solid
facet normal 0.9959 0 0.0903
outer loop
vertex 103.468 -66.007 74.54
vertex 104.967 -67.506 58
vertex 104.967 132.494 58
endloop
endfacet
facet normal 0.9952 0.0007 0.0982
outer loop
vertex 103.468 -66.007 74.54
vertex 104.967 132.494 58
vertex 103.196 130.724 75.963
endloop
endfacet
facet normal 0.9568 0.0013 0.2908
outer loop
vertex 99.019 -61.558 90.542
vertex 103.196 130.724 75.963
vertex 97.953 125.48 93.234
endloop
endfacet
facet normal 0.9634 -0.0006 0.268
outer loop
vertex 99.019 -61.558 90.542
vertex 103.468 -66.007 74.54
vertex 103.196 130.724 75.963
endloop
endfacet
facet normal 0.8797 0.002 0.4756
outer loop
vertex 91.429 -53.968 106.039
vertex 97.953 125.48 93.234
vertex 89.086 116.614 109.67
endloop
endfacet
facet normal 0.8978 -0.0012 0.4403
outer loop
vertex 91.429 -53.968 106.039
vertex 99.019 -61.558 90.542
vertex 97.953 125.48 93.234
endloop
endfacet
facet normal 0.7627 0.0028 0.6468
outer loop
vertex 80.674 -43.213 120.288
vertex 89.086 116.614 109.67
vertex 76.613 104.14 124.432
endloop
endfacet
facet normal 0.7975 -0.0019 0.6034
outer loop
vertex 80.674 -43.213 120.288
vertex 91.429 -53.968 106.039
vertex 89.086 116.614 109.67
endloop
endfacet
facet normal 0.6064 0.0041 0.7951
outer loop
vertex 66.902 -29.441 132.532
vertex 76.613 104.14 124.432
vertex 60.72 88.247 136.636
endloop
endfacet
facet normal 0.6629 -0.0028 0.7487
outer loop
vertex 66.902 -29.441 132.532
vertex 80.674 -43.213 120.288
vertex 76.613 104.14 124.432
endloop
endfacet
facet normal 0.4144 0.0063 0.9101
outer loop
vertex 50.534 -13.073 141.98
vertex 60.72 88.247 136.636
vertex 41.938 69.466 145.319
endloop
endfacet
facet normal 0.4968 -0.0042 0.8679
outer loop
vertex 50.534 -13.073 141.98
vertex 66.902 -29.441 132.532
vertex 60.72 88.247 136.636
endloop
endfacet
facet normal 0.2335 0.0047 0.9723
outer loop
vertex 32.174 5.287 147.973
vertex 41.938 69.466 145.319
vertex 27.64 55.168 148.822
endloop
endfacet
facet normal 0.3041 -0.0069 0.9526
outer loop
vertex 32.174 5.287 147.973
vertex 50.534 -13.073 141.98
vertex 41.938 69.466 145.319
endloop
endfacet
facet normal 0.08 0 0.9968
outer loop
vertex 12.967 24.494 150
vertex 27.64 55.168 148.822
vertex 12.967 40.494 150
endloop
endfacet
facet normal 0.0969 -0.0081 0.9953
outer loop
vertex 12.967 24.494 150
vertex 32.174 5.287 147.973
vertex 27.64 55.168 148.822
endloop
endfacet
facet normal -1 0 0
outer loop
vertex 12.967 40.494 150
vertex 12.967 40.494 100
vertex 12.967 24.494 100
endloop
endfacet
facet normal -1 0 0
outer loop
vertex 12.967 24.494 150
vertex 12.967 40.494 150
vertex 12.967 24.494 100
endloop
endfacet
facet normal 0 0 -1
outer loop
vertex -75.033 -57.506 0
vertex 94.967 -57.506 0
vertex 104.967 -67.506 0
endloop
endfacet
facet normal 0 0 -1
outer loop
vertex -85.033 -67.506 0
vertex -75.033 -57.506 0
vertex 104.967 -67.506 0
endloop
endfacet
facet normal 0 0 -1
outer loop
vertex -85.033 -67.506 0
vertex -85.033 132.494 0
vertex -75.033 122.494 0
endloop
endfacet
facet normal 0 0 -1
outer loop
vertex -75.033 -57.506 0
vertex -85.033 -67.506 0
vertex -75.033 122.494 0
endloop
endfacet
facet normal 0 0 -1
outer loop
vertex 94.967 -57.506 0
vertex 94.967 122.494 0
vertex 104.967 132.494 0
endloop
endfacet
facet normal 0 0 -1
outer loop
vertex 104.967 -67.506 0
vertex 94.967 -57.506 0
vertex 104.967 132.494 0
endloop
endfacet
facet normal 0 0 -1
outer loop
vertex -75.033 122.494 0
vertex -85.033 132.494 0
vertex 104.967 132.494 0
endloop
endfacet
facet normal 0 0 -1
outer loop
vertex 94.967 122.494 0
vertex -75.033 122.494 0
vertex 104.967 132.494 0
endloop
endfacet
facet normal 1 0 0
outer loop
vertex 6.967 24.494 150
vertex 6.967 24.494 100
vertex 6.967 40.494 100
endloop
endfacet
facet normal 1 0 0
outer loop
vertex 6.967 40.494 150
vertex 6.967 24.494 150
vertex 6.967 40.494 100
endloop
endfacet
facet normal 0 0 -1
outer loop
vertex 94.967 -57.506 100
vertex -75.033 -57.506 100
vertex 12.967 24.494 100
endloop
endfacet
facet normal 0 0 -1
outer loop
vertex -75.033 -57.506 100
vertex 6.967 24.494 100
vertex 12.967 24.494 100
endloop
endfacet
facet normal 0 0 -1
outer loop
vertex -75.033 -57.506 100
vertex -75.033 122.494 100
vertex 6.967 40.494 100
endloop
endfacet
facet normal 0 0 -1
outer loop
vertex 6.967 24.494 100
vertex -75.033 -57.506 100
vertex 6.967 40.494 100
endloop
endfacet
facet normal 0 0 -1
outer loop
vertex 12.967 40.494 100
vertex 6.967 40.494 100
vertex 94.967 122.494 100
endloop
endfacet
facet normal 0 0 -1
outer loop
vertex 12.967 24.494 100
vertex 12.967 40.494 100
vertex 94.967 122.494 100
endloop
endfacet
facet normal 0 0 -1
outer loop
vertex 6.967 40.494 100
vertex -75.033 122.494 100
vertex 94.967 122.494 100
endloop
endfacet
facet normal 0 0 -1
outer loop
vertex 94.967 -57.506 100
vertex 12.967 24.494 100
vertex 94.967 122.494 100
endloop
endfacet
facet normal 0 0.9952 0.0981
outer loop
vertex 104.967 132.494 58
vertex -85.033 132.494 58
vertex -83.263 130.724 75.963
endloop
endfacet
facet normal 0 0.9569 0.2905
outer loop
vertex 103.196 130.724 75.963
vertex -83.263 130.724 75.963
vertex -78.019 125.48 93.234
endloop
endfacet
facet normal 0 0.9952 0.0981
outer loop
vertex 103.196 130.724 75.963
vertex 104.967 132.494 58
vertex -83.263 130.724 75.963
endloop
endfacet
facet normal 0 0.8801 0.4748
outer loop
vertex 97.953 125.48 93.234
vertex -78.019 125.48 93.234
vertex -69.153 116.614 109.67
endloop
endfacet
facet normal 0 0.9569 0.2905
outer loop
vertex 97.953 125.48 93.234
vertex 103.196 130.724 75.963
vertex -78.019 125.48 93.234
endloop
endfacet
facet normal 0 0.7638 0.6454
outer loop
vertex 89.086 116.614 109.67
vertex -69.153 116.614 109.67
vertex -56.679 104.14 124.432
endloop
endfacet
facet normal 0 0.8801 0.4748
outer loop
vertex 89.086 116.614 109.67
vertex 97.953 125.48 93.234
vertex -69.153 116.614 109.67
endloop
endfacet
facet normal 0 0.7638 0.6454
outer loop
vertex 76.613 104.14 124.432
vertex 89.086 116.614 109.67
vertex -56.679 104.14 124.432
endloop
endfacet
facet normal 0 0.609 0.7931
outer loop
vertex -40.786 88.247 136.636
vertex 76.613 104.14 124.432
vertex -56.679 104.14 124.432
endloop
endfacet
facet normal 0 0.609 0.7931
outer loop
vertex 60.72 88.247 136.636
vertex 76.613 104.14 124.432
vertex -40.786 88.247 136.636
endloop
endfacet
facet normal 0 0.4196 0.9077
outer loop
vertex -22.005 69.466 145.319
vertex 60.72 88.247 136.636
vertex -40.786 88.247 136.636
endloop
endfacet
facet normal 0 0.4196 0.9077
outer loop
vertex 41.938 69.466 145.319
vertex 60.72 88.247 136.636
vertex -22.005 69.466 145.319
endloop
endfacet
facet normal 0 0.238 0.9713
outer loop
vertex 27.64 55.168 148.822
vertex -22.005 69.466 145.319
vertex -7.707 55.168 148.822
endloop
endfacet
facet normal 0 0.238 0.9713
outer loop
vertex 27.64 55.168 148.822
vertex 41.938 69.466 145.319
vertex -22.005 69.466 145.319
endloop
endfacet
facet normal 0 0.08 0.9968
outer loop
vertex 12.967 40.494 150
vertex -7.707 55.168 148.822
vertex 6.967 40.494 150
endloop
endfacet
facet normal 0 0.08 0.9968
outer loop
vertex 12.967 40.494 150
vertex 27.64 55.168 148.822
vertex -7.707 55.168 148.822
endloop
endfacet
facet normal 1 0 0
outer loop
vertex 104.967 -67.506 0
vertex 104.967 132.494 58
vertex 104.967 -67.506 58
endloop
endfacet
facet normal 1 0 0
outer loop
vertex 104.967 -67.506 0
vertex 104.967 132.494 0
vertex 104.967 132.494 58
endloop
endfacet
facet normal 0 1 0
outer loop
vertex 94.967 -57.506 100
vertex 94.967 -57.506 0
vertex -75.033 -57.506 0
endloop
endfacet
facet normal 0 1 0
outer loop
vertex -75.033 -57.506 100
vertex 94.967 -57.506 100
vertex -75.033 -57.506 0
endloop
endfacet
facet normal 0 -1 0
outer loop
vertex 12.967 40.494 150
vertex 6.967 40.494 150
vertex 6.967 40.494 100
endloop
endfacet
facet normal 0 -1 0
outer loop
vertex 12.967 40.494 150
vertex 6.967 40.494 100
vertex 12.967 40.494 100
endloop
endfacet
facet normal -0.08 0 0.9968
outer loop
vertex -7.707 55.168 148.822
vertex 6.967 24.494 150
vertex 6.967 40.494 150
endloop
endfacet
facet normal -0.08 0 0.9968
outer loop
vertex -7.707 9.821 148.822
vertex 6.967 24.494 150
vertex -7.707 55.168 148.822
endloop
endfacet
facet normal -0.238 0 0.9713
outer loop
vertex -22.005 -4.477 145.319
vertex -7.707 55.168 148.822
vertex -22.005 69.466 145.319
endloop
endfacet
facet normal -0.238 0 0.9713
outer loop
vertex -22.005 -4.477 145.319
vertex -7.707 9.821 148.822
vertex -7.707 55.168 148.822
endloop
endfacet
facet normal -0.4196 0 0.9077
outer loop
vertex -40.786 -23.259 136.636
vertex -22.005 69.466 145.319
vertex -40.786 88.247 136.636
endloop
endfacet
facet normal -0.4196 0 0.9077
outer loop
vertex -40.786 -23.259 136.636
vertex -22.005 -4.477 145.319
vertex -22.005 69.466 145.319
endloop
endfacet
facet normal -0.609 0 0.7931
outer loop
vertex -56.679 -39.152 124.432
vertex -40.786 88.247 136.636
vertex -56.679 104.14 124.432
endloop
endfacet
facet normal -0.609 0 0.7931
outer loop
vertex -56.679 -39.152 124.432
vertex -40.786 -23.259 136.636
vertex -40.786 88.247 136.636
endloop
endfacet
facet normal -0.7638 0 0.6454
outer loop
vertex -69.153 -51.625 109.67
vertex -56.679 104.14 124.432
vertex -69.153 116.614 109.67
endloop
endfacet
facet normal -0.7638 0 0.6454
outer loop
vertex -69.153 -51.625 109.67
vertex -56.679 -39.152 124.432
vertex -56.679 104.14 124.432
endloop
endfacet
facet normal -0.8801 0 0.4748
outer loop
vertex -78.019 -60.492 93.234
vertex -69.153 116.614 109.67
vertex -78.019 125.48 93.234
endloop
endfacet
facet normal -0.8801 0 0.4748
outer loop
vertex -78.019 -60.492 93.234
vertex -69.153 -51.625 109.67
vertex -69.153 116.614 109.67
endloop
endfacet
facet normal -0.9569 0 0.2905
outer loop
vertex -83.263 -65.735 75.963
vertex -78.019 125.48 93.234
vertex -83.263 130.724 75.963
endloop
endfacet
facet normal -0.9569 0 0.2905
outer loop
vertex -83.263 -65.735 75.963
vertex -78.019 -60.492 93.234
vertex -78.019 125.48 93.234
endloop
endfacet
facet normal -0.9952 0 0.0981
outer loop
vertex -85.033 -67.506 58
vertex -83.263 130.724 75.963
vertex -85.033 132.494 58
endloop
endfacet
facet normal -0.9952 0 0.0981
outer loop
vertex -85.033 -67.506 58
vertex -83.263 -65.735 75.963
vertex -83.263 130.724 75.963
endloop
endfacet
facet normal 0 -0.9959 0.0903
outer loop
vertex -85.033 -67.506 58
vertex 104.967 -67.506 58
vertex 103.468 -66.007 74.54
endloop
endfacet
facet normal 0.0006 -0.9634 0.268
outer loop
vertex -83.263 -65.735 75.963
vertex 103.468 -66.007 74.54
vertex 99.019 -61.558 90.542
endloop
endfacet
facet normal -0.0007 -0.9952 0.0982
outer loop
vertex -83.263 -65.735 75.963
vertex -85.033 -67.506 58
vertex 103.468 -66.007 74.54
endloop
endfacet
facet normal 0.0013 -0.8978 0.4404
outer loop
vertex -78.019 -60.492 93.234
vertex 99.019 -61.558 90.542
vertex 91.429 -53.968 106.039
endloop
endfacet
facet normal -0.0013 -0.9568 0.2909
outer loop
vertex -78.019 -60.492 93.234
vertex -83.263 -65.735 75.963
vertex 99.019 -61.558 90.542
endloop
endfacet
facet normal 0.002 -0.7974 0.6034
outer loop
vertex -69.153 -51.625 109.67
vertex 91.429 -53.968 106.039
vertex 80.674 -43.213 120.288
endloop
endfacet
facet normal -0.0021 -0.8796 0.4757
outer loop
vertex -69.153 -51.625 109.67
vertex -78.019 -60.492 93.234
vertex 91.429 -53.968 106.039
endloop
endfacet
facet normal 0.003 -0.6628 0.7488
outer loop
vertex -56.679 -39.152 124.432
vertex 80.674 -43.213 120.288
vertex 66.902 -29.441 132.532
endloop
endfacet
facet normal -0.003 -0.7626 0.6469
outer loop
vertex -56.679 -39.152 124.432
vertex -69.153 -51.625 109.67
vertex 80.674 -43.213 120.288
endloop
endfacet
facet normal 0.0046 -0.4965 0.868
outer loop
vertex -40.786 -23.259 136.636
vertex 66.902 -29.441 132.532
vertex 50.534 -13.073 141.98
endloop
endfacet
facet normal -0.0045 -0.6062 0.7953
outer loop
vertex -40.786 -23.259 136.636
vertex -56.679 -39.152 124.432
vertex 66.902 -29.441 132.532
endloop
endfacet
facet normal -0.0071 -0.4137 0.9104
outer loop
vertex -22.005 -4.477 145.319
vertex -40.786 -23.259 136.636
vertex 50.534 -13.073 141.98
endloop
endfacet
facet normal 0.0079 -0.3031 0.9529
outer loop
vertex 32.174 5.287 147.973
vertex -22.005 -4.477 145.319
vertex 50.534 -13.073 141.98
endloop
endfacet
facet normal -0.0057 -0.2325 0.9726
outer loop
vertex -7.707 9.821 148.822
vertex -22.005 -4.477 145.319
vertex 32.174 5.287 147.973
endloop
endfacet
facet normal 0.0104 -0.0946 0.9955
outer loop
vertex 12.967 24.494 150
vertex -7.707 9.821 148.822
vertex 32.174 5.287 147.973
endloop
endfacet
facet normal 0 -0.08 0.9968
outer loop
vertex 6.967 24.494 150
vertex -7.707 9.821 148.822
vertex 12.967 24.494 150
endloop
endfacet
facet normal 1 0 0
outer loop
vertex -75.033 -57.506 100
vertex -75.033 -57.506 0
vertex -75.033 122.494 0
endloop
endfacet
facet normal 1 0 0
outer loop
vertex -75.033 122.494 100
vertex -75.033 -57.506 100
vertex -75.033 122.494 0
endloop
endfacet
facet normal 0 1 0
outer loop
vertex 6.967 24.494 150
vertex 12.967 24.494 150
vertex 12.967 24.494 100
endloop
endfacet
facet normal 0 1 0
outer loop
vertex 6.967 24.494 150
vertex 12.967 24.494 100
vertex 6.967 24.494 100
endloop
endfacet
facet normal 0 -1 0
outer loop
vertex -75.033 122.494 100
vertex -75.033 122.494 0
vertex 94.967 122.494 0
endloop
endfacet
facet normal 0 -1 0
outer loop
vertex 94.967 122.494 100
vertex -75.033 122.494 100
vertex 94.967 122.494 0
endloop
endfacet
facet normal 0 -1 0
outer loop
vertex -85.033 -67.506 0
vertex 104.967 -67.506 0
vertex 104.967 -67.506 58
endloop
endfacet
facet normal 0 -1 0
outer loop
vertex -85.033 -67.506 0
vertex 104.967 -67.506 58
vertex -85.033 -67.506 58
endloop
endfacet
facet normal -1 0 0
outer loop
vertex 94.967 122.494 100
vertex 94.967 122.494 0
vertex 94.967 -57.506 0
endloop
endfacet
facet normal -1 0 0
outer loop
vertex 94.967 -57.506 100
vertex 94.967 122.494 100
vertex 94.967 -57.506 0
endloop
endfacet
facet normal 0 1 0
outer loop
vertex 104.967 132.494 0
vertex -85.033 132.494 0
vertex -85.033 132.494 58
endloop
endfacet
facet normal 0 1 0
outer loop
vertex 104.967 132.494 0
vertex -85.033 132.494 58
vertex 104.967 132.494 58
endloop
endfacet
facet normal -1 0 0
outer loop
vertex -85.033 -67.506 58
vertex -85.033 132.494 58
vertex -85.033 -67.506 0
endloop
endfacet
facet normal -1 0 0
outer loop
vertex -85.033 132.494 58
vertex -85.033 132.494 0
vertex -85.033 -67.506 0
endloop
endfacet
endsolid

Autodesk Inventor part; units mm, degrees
ref_plane "YZ Plane" through (0, 0, 0) normal (1, 0, 0) x (0, 1, 0)
ref_plane "XZ Plane" through (0, 0, 0) normal (0, 1, 0) x (-1, 0, 0)
ref_plane "XY Plane" through (0, 0, 0) normal (0, 0, 1) x (1, 0, 0)
sketch "Skizze1" plane through (0, 0, 0) normal (0, 0, 1) x (1, 0, 0)
  line L0 (-123.0333, 0) -> (142.9667, 0) projected
  line L1 (0, -107.5057) -> (0, 172.4943) projected
  line L2 (-75.0333, 122.4943) -> (94.9667, 122.4943)
  line L3 (94.9667, 122.4943) -> (94.9667, -57.5057)
  line L4 (94.9667, -57.5057) -> (-75.0333, -57.5057)
  line L5 (-75.0333, -57.5057) -> (-75.0333, 122.4943)
  line L6 (-85.0333, 132.4943) -> (104.9667, 132.4943)
  line L7 (104.9667, 132.4943) -> (104.9667, -67.5057)
  line L8 (104.9667, -67.5057) -> (-85.0333, -67.5057)
  line L9 (-85.0333, -67.5057) -> (-85.0333, 132.4943)
  point P0 (0, 0)
  dimension "d0" = 170
  dimension "d1" = 180
  dimension "d2" = 10
  dimension "d3" = 10
  dimension "d4" = 10
  dimension "d5" = 10
extrude "Extrusion1" add sketch "Skizze1" along normal blind 100 contours L9 L6 L1 L2 L5 L0 | L0 L5 L4 L1 L8 L9 | L1 L4 L3 L0 L7 L8 | L6 L7 L0 L3 L2 L1
sketch "Skizze2" plane through (0, 0, 100) normal (0, 0, 1) x (1, 0, 0)
  point P0 (0, 0)
sketch "Skizze3" plane through (0, 0, 100) normal (0, 0, 1) x (1, 0, 0)
  line L0 (-85.0333, 132.4943) -> (-85.0333, -67.5057) projected
  line L1 (-85.0333, 132.4943) -> (104.9667, 132.4943)
  line L2 (104.9667, 132.4943) -> (104.9667, -67.5057)
  line L3 (104.9667, -67.5057) -> (-85.0333, -67.5057)
  line L4 (-85.0333, -67.5057) -> (-85.0333, 132.4943)
  point P0 (0, 0)
extrude "Extrusion2" add sketch "Skizze3" along normal blind 50
fillet "Rundung1" radius 92 4 edges at (-85.0333, 32.4943, 150) (9.9667, 132.4943, 150) (9.9667, -67.5057, 150) (104.9667, 32.4943, 150)
sketch "Skizze4" plane through (0, 0, 150) normal (0, 0, 1) x (1, 0, 0)
  point P0 (0, 0)
sketch "Skizze5" plane through (0, 0, 150) normal (0, 0, 1) x (1, 0, 0)
  line L0 (6.9667, 24.4943) -> (6.9667, 40.4943) projected
  line L1 (94.8203, -57.3593) -> (12.9667, 24.4943) projected
  line L2 (6.9667, 40.4943) -> (12.9667, 40.4943)
  line L3 (12.9667, 40.4943) -> (12.9667, 24.4943)
  line L4 (12.9667, 24.4943) -> (6.9667, 24.4943)
  line L5 (6.9667, 24.4943) -> (6.9667, 40.4943)
  point P0 (0, 0)
extrude "Extrusion3" cut sketch "Skizze5" against normal blind 50
properties part number "Deckel" material "PMMA-Kunststoff"
